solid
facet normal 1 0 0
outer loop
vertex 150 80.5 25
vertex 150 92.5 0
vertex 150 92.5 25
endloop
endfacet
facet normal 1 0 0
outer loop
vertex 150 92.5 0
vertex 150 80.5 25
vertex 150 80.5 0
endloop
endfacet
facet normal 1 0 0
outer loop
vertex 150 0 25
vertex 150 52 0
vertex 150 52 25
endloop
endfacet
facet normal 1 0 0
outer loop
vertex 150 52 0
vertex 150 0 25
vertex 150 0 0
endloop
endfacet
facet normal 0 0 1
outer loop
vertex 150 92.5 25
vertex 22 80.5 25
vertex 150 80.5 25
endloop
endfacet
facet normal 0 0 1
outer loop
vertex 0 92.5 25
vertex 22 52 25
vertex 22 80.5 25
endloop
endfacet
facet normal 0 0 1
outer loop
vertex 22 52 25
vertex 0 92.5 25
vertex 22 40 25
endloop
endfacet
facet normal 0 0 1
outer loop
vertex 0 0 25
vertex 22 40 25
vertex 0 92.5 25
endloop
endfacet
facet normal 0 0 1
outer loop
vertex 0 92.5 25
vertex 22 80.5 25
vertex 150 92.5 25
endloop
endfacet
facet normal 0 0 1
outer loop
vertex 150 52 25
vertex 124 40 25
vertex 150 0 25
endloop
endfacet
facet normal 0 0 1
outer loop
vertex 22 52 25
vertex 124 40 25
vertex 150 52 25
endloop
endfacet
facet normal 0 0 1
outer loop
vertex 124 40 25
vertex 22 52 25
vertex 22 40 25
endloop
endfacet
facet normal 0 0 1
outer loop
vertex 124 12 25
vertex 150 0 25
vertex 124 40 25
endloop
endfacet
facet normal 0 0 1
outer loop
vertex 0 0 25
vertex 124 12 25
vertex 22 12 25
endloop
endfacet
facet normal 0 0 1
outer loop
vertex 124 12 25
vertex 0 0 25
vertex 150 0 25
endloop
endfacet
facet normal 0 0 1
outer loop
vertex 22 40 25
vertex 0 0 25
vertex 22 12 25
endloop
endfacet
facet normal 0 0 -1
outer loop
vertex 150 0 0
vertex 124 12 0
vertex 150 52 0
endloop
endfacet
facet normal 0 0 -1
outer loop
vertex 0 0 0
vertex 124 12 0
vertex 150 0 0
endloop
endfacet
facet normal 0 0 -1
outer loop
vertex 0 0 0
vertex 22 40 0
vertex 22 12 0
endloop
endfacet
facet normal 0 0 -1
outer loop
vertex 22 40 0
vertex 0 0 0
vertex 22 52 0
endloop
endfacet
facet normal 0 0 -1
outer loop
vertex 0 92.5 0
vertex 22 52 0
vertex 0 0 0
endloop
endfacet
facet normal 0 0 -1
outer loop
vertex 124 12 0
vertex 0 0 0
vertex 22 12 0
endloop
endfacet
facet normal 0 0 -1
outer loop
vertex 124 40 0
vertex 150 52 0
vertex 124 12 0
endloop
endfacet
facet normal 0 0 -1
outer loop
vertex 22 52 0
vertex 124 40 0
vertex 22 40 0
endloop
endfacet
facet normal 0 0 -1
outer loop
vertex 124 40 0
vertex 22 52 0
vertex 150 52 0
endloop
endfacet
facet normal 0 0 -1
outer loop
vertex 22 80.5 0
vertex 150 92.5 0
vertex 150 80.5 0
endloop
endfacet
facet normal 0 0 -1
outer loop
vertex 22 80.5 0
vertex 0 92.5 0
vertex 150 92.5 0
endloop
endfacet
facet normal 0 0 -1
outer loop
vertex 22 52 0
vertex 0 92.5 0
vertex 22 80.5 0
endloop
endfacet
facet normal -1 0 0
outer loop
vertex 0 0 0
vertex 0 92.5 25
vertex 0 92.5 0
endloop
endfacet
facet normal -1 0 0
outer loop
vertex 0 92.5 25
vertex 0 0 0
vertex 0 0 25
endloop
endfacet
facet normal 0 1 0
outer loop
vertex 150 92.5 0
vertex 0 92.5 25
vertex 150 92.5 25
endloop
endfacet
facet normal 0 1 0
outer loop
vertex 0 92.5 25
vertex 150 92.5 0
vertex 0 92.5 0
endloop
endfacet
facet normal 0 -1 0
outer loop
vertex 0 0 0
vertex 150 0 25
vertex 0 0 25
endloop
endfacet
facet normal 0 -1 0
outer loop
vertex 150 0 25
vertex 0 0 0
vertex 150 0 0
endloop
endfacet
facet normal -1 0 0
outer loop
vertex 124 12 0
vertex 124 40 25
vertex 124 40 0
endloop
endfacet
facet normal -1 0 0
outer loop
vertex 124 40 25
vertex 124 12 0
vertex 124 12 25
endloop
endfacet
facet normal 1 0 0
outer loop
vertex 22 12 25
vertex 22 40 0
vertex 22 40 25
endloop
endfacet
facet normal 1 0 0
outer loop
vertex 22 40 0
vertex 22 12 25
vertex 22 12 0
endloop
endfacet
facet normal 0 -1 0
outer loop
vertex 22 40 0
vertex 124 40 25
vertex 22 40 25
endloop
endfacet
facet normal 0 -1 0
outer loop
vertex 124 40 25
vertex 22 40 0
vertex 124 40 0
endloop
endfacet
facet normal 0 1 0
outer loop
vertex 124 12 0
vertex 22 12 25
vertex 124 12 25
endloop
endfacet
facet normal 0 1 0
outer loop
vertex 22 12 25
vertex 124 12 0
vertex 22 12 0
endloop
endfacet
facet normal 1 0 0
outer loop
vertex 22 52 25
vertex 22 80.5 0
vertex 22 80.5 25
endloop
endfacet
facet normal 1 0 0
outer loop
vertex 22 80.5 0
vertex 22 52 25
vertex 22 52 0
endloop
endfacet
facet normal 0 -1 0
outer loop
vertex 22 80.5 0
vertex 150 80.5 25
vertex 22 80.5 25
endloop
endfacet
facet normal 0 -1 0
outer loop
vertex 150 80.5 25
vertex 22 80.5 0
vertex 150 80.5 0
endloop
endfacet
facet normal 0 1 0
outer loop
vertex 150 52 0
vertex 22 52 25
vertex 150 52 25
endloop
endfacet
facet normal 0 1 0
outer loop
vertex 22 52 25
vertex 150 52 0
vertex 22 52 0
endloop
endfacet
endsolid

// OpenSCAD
// import("/Users/mike.zappitello/Desktop/switch.stl");

z_height = 25;
wall_thickness = 12;

switch_gap_height = 28;
switch_gap_width = 102;
table_gap = 28.5;

solid_height = switch_gap_height + table_gap + (wall_thickness * 3);
solid_width = 150;

start_x = 0; start_y = 0; start_z = 0;


difference() {
translate([start_x, start_y, start_z])
	cube([solid_width, solid_height, z_height], center = false);
	
translate([start_x + wall_thickness + 10, start_y + wall_thickness, start_z- 0.1])
	cube([switch_gap_width, switch_gap_height, z_height + 0.2], center = false);
	
translate([start_x + wall_thickness + 10, start_y + 2 * wall_thickness + switch_gap_height, start_z - 0.1])
	cube([solid_width, table_gap, z_height + 0.2]);
}
